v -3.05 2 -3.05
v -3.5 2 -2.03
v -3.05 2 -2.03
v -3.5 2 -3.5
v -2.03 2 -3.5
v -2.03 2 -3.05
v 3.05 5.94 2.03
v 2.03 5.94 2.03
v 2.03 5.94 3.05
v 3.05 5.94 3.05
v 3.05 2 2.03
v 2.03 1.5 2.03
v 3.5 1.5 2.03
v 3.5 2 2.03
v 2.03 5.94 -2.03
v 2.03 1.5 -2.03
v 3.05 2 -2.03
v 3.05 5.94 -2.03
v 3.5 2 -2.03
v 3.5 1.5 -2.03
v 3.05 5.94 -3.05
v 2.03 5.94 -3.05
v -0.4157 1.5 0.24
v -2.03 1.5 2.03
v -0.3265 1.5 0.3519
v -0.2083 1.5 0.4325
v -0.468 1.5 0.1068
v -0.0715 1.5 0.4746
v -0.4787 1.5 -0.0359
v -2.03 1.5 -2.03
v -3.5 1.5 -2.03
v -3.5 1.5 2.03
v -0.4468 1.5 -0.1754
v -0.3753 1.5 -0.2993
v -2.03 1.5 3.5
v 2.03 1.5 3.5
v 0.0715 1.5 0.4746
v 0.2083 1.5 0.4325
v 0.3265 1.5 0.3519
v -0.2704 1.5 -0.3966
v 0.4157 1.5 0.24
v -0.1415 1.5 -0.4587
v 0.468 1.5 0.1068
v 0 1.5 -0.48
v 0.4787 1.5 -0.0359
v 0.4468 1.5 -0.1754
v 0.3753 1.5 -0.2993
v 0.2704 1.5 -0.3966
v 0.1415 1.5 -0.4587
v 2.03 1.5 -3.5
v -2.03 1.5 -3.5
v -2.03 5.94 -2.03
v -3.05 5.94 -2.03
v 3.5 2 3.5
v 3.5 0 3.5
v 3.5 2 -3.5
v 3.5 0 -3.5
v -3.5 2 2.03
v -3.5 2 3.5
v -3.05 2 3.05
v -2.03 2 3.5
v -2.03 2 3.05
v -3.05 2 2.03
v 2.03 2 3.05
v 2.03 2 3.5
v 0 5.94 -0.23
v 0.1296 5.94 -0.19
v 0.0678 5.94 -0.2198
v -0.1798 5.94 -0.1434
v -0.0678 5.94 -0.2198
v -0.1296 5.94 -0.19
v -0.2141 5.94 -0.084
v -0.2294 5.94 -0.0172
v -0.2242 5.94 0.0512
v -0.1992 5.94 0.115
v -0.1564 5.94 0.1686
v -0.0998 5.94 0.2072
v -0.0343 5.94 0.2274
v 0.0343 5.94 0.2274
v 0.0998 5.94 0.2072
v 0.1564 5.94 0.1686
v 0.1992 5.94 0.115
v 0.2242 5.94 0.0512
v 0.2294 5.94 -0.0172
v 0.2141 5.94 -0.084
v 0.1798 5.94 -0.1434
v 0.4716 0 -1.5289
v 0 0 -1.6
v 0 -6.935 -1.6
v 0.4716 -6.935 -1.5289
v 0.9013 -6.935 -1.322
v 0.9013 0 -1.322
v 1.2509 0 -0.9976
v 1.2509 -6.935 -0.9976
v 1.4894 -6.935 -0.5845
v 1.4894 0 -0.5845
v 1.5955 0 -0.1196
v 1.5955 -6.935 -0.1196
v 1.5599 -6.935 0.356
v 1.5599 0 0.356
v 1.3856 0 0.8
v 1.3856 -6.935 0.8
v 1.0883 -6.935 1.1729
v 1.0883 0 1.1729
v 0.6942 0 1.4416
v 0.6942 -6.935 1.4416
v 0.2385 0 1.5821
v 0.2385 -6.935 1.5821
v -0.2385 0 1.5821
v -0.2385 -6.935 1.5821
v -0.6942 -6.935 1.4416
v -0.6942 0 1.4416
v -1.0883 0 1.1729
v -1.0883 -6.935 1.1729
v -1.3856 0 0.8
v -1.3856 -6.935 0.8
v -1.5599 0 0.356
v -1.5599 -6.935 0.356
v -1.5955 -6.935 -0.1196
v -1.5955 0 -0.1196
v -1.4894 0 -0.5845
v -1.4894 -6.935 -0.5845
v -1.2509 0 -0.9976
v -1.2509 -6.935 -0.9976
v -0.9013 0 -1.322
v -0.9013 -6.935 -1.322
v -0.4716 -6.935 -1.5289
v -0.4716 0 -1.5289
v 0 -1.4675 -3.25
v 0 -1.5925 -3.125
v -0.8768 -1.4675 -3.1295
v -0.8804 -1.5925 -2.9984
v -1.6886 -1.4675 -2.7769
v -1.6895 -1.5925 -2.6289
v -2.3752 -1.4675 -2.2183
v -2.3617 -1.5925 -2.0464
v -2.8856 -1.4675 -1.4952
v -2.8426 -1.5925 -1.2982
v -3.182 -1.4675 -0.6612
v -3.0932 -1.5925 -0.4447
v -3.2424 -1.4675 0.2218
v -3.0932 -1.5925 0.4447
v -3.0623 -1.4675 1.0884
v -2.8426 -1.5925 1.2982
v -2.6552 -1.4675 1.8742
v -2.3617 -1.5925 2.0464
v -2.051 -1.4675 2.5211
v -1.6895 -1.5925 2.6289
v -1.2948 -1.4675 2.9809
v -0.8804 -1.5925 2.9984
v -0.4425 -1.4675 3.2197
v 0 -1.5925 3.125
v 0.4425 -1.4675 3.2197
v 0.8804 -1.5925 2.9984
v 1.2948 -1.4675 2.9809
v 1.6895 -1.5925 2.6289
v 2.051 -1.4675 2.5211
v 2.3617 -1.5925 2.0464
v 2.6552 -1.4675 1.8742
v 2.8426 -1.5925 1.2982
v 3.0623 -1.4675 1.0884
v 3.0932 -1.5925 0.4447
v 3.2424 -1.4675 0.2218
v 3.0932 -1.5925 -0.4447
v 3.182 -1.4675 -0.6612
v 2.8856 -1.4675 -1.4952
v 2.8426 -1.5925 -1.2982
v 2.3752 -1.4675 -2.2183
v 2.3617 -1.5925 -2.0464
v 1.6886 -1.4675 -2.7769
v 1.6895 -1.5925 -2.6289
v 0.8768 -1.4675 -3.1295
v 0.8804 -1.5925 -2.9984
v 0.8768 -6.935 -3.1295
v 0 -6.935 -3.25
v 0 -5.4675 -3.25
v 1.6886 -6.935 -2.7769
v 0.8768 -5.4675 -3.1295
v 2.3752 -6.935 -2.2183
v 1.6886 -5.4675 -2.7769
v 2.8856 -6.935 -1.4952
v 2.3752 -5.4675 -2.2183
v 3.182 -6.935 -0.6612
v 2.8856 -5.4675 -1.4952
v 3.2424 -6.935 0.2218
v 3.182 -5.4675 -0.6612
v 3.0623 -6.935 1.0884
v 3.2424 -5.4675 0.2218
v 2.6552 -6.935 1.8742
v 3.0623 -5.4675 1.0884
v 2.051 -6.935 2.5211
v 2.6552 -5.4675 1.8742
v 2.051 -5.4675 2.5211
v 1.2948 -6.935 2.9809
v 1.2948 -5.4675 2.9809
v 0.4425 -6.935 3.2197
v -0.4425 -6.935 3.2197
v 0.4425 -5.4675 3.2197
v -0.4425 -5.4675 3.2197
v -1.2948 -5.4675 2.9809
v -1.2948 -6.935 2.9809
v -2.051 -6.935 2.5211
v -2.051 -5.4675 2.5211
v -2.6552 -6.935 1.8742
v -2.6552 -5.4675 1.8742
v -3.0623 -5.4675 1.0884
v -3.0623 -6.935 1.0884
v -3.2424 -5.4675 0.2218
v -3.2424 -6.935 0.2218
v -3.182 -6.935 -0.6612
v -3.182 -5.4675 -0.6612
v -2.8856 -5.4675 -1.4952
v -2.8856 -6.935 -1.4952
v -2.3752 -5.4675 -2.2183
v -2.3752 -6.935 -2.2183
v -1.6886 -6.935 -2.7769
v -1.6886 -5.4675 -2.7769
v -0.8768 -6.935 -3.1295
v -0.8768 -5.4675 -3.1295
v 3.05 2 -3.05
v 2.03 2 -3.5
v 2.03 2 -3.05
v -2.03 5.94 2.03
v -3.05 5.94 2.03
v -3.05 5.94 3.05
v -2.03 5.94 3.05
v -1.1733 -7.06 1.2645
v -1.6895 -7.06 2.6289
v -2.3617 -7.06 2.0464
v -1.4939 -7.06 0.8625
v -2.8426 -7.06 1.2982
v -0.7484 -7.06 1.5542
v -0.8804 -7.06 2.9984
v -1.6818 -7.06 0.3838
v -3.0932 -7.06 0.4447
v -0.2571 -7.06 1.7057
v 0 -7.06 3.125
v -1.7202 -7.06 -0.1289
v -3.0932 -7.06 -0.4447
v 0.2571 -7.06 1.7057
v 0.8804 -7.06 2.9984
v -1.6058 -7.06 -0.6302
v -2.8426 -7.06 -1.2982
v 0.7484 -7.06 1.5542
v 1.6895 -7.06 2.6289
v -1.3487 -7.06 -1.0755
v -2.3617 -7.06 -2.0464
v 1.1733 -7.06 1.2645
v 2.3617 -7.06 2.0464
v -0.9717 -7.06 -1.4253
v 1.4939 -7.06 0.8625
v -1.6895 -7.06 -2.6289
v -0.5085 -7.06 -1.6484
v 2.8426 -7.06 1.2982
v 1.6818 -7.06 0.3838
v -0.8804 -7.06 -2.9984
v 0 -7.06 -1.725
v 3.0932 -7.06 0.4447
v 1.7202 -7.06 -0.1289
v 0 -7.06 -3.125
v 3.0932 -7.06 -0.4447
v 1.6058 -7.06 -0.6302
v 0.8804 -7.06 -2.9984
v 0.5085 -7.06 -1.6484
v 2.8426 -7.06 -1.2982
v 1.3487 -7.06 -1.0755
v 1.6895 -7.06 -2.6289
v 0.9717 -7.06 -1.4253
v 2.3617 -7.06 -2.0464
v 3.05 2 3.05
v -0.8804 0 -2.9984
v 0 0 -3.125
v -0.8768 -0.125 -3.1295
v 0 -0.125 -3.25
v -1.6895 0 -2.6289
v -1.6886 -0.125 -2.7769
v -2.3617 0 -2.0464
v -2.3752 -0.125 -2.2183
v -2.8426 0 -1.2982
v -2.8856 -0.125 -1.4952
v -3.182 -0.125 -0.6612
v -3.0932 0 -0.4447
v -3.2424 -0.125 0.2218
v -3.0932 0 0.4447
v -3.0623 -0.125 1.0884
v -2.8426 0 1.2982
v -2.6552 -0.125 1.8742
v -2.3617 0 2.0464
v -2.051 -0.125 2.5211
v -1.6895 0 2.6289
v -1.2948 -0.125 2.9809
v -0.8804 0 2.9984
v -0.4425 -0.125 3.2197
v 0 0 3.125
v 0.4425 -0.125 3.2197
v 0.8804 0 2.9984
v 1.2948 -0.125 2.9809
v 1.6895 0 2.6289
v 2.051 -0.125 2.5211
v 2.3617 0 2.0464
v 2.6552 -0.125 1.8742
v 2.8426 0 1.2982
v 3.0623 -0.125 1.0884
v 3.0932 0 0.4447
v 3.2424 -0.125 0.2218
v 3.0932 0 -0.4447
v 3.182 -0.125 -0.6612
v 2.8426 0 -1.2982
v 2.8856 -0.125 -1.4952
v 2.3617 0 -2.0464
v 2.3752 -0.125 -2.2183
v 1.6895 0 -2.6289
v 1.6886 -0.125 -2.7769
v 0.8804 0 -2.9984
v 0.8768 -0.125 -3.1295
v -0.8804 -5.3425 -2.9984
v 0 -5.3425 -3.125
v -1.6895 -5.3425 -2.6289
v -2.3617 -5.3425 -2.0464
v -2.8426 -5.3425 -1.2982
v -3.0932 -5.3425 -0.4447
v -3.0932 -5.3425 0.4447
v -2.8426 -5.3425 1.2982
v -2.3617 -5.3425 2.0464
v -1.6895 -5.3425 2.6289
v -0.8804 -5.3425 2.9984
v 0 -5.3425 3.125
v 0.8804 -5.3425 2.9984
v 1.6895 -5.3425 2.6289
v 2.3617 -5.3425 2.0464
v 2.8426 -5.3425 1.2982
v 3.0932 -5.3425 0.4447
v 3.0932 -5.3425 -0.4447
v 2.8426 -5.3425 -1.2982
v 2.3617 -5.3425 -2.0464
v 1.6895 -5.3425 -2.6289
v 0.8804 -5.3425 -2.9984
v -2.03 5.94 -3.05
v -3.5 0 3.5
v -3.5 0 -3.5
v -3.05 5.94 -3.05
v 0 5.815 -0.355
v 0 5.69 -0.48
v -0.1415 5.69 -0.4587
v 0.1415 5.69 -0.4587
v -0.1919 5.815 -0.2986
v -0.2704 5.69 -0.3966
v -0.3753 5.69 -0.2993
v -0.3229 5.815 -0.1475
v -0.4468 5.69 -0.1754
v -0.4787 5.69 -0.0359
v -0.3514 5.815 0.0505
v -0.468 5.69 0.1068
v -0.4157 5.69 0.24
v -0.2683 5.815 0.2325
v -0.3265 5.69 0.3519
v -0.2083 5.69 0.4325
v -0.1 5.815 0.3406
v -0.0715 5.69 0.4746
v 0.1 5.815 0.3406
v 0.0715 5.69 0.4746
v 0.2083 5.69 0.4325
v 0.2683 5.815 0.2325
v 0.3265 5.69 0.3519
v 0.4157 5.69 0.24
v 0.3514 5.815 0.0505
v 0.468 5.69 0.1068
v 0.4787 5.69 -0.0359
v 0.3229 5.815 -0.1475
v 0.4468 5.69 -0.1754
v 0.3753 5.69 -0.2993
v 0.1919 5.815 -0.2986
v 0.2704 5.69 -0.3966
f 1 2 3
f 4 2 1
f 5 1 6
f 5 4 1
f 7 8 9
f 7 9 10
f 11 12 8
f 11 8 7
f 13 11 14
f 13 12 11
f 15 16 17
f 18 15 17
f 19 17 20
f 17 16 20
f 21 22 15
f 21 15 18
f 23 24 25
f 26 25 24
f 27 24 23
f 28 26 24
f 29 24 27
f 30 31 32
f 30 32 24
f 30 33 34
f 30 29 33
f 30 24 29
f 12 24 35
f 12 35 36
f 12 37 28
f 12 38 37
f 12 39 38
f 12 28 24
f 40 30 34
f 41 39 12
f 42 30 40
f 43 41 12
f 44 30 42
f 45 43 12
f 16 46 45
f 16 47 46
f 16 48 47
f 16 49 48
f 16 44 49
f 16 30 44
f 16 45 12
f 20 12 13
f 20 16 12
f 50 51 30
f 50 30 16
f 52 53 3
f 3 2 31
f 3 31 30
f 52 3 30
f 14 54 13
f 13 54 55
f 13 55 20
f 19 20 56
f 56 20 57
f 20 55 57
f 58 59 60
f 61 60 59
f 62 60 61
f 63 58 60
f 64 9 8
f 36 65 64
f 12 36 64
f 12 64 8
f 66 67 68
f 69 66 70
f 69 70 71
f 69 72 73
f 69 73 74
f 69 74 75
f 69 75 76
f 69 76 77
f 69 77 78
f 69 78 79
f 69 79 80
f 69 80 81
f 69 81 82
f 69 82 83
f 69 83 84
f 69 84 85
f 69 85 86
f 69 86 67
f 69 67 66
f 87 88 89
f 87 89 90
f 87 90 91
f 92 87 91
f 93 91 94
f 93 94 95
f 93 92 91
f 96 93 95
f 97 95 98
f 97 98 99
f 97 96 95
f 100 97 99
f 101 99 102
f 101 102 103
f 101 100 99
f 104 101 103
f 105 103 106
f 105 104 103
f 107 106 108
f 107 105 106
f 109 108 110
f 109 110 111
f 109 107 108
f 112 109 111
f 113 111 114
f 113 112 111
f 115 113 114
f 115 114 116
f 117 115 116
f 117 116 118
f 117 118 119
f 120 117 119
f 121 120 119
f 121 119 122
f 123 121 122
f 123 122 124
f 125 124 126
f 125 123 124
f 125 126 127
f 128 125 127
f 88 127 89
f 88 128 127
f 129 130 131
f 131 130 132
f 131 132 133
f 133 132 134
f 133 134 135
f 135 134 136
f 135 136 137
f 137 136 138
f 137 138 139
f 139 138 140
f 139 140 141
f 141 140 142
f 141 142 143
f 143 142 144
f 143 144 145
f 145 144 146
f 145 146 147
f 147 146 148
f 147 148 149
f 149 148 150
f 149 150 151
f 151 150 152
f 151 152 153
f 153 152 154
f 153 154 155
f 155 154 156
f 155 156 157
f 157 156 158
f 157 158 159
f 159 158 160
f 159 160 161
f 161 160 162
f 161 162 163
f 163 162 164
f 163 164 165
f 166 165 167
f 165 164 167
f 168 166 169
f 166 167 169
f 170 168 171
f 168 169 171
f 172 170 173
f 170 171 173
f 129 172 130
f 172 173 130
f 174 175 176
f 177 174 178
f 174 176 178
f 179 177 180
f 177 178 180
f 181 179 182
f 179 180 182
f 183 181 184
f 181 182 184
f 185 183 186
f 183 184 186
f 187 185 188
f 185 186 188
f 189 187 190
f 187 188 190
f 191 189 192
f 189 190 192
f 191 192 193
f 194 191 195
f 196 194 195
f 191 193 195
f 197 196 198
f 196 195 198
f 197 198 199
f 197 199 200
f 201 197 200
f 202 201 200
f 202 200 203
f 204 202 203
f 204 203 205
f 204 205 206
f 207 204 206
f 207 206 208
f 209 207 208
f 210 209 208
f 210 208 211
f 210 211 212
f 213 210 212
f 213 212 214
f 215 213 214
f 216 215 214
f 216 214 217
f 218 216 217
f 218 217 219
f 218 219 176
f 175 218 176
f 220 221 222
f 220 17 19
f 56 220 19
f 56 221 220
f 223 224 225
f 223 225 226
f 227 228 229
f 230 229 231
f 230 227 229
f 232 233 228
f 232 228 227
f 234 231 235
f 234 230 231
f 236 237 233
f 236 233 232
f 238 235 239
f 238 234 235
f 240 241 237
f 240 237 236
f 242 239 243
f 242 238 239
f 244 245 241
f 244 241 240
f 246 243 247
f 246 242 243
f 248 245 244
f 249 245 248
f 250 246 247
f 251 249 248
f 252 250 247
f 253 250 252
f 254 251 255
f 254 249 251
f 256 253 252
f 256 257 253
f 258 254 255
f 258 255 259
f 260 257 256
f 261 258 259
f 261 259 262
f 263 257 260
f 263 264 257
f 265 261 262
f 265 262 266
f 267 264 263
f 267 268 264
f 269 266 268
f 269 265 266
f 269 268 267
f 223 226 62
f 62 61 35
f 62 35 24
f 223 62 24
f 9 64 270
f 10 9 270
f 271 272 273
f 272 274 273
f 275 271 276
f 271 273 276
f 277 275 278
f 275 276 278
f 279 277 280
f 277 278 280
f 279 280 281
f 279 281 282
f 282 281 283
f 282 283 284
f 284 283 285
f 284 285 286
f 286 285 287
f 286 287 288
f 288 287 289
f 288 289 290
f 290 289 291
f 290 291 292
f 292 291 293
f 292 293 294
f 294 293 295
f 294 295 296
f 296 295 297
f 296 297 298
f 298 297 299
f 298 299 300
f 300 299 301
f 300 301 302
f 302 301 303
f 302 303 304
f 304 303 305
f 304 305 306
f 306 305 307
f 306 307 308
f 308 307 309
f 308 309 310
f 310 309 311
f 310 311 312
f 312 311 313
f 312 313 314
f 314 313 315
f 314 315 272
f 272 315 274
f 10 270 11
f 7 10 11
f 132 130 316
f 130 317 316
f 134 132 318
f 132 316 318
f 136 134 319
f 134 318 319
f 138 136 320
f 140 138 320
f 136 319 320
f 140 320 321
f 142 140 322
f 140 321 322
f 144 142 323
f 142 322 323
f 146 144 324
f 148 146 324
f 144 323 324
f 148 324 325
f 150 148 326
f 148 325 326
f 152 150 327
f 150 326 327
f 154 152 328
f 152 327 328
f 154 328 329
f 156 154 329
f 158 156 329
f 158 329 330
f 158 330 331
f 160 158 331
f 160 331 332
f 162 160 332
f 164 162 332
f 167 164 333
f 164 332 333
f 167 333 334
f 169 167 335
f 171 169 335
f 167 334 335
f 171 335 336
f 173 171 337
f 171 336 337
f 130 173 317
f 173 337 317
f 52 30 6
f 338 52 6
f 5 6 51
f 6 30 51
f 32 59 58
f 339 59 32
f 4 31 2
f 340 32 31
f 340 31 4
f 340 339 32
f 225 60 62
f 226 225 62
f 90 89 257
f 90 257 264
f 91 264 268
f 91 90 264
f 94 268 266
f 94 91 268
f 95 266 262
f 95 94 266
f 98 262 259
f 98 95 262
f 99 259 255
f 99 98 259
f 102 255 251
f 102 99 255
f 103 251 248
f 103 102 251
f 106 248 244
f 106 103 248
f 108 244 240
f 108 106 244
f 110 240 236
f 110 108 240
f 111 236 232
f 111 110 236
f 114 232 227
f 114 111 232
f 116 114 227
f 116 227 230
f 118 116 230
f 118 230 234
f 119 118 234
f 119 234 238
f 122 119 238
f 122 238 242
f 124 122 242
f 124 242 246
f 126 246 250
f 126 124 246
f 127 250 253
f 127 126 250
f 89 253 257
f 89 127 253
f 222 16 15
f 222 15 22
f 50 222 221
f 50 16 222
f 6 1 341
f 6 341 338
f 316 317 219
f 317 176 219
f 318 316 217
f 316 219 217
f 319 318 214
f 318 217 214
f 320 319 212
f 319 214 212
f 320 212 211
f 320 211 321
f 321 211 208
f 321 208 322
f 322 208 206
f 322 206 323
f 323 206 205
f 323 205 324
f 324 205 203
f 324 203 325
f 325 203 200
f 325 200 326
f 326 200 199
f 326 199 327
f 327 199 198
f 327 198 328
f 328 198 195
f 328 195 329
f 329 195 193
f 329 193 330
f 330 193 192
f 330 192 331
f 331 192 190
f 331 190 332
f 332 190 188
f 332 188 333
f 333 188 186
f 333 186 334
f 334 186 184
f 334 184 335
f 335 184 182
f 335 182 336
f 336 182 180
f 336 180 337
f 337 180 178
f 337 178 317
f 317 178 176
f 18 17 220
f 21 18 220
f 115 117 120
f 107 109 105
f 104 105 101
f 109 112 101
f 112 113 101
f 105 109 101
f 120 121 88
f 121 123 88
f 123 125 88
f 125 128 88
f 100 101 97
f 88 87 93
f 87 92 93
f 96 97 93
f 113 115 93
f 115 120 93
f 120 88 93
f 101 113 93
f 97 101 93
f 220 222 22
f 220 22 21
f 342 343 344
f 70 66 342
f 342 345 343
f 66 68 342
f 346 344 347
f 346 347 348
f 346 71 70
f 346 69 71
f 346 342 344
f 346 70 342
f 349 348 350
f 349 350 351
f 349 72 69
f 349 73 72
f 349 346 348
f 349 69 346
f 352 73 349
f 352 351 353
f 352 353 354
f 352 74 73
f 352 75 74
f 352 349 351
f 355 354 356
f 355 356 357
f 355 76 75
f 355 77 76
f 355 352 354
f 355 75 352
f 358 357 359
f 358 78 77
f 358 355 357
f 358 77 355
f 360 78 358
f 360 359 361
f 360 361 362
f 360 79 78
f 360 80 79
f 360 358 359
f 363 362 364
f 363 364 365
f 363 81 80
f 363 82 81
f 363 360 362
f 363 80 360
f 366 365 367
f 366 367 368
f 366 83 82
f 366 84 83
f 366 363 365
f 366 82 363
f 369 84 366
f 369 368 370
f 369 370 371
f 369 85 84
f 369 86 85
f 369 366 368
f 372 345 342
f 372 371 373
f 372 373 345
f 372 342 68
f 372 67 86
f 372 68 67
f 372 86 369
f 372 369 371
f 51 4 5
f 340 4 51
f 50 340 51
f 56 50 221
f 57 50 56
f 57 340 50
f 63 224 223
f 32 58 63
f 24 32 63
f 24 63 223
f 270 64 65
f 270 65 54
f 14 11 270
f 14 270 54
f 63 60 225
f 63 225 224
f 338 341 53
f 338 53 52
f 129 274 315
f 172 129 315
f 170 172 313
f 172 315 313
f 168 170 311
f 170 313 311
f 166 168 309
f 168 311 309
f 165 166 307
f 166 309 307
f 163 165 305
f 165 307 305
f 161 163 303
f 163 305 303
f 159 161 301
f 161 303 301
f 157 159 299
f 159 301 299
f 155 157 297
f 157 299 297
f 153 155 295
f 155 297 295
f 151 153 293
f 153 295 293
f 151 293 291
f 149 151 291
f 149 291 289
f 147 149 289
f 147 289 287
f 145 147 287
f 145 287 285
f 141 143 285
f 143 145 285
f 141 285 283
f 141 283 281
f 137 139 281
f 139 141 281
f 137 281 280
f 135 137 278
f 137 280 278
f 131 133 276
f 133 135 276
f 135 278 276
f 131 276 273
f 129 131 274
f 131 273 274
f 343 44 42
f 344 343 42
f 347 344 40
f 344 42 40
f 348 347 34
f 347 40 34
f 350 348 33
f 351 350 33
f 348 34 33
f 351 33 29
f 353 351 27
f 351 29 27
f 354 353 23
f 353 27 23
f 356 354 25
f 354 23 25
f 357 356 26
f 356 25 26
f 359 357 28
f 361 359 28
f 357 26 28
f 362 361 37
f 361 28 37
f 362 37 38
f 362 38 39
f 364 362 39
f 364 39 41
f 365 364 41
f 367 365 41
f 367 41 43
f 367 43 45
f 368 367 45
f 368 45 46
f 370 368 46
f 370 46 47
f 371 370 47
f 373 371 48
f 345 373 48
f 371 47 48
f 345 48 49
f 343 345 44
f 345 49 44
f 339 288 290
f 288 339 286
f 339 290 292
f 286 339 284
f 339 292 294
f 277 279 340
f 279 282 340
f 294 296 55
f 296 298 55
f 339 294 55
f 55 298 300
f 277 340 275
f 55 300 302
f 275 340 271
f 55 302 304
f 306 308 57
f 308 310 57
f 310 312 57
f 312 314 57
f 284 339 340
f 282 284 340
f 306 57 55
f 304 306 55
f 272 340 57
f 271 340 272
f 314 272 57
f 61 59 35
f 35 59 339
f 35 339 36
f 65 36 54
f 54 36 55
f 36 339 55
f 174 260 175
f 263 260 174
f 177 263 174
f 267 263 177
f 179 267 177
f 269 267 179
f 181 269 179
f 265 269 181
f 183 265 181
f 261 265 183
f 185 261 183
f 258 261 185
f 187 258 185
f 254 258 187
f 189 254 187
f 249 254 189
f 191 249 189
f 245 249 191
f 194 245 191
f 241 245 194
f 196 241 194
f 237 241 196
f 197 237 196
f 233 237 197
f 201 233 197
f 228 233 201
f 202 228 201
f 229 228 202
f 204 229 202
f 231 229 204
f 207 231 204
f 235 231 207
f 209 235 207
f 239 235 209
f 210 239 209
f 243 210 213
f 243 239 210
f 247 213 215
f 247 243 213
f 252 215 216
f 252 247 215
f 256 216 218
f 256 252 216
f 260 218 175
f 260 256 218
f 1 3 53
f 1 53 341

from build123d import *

# Parameters (mm, degrees)
SKETCH1_W           = 7
SKETCH1_H           = 7
BOSS_EXTRUDE1_DEPTH = 1.5
SKETCH2_W           = 1.47
SKETCH2_H           = 1.47
BOSS_EXTRUDE2_DEPTH = 0.5
SKETCH3_W           = 1.02
SKETCH3_H           = 1.02
BOSS_EXTRUDE3_DEPTH = 3.94
SKETCH4_R           = 3.25
SKETCH4_R_2         = 1.6
BOSS_EXTRUDE4_DEPTH = 7.06
CHAMFER1_SIZE       = 0.125
SKETCH7_R           = 0.48
BOSS_EXTRUDE5_DEPTH = 4.44
CHAMFER2_SIZE       = 0.25


with BuildPart() as part:
    # Sketch1 → Boss-Extrude1 (new body)
    with BuildSketch(Plane(origin=(0, 0, 0), x_dir=(1, 0, 0), z_dir=(0, 1, 0))):
        Rectangle(SKETCH1_W, SKETCH1_H)
    extrude(amount=BOSS_EXTRUDE1_DEPTH)

    # Sketch2 → Boss-Extrude2 (add)
    with BuildSketch(Plane(origin=(0, 1.5, 0), x_dir=(1, 0, 0), z_dir=(0, 1, 0))):
        with Locations((-2.765, 2.765)):
            Rectangle(SKETCH2_W, SKETCH2_H)
        with Locations((2.765, 2.765)):
            Rectangle(SKETCH2_W, SKETCH2_H)
        with Locations((2.765, -2.765)):
            Rectangle(SKETCH2_W, SKETCH2_H)
        with Locations((-2.765, -2.765)):
            Rectangle(SKETCH2_W, SKETCH2_H)
    extrude(amount=BOSS_EXTRUDE2_DEPTH)

    # Sketch3 → Boss-Extrude3 (add)
    with BuildSketch(Plane(origin=(0, 2, 0), x_dir=(1, 0, 0), z_dir=(0, 1, 0))):
        with Locations((-2.54, -2.54)):
            Rectangle(SKETCH3_W, SKETCH3_H)
        with Locations((2.54, -2.54)):
            Rectangle(SKETCH3_W, SKETCH3_H)
        with Locations((2.54, 2.54)):
            Rectangle(SKETCH3_W, SKETCH3_H)
        with Locations((-2.54, 2.54)):
            Rectangle(SKETCH3_W, SKETCH3_H)
    extrude(amount=BOSS_EXTRUDE3_DEPTH)

    # Sketch4 → Boss-Extrude4 (add)
    with BuildSketch(Plane.XZ):
        with Locations(Location((0, 0, 0), (0, 0, 270))):
            Circle(SKETCH4_R)
        with Locations(Location((0, 0, 0), (0, 0, 270))):
            Circle(SKETCH4_R_2, mode=Mode.SUBTRACT)
    extrude(amount=BOSS_EXTRUDE4_DEPTH)

    # Chamfer1
    chamfer1_edges = [part.edges().sort_by_distance(p)[0] for p in [
        (0, -7.06, 1.6),
        (0, -7.06, 3.25),
    ]]
    chamfer(chamfer1_edges, length=CHAMFER1_SIZE)

    # Sketch5 → Cut-Revolve1 (revolve, cut)
    with BuildSketch(Plane.XY, mode=Mode.PRIVATE) as cut_revolve1_sk:
        Polygon((-3.25, -1.4675), (-3.125, -1.5925), (-3.125, -5.3425), (-3.25, -5.4675), align=None)
        Polygon((-3.25, 0), (-3.125, 0), (-3.25, -0.125), align=None)
    revolve(cut_revolve1_sk.sketch.rotate(Axis((0, -6.81, 0), (0, 1, 0)), 270), axis=Axis((0, -6.81, 0), (0, 1, 0)), mode=Mode.SUBTRACT)

    # Sketch7 → Boss-Extrude5 (add)
    with BuildSketch(Plane(origin=(0, 1.5, 0), x_dir=(1, 0, 0), z_dir=(0, 1, 0))):
        with Locations(Location((0, 0, 0), (0, 0, 90))):
            Circle(SKETCH7_R)
    extrude(amount=BOSS_EXTRUDE5_DEPTH)

    # Chamfer2
    chamfer2_edges = [part.edges().sort_by_distance(p)[0] for p in [
        (0, 5.94, 0.48),
    ]]
    chamfer(chamfer2_edges, length=CHAMFER2_SIZE)


solid = part.part
